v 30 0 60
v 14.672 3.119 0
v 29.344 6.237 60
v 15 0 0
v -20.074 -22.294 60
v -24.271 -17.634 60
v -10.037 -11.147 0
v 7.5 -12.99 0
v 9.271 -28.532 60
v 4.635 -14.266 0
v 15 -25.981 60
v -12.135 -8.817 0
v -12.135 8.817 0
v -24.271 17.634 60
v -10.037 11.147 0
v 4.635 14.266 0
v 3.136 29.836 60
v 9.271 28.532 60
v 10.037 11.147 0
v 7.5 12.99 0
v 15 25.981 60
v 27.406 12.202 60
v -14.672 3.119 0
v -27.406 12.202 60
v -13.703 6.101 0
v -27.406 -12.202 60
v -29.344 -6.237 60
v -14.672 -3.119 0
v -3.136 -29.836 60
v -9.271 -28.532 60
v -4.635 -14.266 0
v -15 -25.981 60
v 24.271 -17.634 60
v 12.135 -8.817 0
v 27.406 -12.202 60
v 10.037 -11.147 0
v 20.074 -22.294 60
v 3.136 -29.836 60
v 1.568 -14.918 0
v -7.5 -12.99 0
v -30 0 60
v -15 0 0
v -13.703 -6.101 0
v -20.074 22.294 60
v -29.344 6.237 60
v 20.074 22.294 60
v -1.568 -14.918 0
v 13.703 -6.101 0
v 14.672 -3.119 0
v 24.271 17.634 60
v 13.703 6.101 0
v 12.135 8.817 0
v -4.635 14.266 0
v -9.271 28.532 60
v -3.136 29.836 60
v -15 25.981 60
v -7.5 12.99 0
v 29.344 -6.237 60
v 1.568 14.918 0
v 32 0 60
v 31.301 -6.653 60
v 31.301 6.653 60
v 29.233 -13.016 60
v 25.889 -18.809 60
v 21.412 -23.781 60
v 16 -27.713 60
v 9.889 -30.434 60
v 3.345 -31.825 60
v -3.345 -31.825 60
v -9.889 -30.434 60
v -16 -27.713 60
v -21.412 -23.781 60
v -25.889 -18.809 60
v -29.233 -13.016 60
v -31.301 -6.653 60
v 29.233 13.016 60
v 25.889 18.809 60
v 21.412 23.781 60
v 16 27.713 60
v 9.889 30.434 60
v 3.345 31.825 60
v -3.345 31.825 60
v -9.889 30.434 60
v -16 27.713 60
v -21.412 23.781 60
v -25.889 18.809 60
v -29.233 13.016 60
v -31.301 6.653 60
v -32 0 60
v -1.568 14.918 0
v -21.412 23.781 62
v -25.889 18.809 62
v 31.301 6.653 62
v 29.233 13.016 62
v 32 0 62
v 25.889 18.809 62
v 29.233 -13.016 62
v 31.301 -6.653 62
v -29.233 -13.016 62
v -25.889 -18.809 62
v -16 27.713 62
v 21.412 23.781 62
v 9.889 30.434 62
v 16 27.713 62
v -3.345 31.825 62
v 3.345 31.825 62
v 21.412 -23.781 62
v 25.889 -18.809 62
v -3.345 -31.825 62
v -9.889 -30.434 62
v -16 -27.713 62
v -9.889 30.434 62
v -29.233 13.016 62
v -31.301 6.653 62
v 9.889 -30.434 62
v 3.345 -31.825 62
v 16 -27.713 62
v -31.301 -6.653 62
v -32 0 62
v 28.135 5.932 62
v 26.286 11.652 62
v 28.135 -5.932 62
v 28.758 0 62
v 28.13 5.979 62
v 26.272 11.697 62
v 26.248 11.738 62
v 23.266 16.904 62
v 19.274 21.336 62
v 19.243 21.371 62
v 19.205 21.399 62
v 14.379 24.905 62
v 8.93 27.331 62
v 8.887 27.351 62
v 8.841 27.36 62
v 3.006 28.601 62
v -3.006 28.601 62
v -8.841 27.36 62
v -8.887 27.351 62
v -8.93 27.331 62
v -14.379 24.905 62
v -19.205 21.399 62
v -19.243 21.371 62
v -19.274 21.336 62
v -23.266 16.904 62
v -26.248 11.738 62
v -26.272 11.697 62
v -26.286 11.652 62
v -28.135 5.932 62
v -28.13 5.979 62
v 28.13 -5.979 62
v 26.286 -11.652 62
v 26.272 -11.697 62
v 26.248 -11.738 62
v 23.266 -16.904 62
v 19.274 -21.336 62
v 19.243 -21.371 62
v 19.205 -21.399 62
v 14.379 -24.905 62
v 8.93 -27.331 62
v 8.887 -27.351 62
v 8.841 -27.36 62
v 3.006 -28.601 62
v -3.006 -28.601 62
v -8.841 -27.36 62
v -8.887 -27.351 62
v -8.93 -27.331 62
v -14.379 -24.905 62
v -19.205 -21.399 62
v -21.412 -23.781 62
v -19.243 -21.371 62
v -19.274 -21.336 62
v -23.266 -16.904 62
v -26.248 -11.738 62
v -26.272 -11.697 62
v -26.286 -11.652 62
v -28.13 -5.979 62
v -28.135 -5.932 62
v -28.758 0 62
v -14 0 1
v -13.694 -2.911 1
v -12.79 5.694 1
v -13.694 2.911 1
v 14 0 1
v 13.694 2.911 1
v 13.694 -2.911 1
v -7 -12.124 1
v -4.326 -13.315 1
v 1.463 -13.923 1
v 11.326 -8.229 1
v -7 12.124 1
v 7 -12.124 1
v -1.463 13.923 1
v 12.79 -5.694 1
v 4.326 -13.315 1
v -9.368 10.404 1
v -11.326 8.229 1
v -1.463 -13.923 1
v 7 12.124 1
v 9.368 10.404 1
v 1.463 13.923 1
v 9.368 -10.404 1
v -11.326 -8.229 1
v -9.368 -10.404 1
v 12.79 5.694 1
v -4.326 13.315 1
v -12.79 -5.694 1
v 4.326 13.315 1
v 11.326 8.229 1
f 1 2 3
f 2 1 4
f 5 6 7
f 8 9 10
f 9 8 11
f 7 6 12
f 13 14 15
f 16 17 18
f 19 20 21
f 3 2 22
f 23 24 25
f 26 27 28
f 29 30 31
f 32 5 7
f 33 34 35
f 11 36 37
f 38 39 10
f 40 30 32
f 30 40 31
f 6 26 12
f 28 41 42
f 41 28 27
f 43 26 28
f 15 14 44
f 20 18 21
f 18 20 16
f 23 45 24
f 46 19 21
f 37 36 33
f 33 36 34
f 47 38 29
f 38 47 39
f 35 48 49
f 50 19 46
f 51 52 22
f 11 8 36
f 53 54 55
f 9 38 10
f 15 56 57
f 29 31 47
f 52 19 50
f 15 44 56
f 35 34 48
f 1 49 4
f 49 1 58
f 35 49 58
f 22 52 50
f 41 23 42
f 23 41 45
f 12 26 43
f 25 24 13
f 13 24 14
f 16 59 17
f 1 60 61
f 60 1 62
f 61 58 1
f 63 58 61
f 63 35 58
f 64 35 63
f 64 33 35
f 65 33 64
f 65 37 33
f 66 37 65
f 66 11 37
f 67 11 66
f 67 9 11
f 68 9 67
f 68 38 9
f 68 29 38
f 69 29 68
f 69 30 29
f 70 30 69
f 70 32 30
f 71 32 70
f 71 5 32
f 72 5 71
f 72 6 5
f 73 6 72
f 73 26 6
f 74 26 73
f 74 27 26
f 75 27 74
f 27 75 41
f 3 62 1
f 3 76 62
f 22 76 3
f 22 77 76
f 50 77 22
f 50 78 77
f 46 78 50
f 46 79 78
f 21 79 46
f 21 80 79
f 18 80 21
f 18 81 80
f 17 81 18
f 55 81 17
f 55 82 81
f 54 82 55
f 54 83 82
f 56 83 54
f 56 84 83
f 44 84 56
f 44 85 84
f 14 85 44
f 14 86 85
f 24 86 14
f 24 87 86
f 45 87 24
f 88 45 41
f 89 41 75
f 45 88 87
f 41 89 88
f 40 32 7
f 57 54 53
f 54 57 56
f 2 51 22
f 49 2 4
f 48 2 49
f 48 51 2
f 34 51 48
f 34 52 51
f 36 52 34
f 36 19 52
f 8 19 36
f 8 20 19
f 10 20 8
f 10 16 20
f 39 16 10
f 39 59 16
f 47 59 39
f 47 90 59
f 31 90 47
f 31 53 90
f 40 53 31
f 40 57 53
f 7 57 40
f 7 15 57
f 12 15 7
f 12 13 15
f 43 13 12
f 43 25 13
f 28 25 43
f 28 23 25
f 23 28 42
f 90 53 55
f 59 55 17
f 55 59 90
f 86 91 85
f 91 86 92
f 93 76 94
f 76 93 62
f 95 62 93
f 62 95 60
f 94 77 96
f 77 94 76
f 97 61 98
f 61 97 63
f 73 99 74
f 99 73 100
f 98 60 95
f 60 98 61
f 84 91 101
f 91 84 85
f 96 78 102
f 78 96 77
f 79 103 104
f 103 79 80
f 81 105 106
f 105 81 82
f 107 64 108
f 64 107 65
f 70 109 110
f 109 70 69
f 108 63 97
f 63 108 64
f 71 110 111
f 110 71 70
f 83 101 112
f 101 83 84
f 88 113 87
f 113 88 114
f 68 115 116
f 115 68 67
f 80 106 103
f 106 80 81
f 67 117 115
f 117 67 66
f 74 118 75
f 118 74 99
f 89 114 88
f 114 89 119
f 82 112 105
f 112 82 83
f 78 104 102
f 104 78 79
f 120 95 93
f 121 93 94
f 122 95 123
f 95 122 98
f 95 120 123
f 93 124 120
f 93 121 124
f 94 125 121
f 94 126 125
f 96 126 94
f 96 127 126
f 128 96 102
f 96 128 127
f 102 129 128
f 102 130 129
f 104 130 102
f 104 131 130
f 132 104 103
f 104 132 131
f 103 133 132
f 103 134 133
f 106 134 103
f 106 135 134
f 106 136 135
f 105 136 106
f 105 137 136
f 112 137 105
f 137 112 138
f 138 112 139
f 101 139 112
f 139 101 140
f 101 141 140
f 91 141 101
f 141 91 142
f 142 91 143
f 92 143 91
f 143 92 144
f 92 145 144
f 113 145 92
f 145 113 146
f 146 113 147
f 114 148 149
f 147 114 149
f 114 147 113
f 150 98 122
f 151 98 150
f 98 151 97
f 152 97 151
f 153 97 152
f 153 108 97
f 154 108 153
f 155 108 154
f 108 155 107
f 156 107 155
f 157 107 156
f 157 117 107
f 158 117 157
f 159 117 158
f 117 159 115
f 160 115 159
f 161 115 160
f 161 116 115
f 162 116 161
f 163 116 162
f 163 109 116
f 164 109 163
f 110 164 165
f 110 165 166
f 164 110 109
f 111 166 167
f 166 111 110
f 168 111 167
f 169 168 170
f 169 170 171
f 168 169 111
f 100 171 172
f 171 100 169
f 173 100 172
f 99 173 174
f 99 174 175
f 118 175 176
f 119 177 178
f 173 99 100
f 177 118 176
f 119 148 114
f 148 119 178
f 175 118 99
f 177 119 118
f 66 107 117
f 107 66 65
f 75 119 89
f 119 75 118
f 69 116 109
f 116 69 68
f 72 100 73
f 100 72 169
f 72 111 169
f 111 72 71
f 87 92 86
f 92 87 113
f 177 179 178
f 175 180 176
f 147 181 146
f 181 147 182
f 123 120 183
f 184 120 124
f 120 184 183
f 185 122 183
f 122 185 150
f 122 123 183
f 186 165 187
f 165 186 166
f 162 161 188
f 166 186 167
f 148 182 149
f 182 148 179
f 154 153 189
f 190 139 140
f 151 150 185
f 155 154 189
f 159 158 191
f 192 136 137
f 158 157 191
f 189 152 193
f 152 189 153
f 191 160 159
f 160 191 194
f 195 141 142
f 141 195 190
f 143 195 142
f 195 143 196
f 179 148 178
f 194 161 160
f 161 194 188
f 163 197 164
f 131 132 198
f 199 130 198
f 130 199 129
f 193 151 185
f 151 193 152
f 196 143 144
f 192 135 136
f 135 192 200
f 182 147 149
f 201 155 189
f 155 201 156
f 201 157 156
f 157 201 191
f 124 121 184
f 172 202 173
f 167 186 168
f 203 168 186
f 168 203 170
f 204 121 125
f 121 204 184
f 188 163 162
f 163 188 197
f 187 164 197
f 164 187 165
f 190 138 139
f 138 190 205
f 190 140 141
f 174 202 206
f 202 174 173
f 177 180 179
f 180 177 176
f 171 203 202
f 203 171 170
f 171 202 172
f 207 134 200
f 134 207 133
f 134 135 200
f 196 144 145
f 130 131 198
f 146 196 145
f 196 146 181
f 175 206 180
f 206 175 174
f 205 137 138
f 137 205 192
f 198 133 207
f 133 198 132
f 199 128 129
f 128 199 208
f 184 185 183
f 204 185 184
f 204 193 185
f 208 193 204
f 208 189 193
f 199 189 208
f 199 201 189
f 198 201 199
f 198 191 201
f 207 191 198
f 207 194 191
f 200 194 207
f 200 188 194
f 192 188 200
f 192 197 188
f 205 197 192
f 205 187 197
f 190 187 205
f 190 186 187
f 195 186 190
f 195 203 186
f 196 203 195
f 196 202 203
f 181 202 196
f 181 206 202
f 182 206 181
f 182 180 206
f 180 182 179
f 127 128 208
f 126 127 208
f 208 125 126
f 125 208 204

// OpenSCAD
module pahar_plastic();
{
    difference() {
  
     union(){
   //union uneste 2obiecte ca fiind 1singur obiect
   cylinder(h=60, r1=15, r2=30); 
        translate([0, 0, 60]) cylinder(h=2, r=32);
     }
     translate([0, 0, 1]) cylinder( h=62, r1=15-1, r2=30-1);
        
    }
}


pahar_plastic();
